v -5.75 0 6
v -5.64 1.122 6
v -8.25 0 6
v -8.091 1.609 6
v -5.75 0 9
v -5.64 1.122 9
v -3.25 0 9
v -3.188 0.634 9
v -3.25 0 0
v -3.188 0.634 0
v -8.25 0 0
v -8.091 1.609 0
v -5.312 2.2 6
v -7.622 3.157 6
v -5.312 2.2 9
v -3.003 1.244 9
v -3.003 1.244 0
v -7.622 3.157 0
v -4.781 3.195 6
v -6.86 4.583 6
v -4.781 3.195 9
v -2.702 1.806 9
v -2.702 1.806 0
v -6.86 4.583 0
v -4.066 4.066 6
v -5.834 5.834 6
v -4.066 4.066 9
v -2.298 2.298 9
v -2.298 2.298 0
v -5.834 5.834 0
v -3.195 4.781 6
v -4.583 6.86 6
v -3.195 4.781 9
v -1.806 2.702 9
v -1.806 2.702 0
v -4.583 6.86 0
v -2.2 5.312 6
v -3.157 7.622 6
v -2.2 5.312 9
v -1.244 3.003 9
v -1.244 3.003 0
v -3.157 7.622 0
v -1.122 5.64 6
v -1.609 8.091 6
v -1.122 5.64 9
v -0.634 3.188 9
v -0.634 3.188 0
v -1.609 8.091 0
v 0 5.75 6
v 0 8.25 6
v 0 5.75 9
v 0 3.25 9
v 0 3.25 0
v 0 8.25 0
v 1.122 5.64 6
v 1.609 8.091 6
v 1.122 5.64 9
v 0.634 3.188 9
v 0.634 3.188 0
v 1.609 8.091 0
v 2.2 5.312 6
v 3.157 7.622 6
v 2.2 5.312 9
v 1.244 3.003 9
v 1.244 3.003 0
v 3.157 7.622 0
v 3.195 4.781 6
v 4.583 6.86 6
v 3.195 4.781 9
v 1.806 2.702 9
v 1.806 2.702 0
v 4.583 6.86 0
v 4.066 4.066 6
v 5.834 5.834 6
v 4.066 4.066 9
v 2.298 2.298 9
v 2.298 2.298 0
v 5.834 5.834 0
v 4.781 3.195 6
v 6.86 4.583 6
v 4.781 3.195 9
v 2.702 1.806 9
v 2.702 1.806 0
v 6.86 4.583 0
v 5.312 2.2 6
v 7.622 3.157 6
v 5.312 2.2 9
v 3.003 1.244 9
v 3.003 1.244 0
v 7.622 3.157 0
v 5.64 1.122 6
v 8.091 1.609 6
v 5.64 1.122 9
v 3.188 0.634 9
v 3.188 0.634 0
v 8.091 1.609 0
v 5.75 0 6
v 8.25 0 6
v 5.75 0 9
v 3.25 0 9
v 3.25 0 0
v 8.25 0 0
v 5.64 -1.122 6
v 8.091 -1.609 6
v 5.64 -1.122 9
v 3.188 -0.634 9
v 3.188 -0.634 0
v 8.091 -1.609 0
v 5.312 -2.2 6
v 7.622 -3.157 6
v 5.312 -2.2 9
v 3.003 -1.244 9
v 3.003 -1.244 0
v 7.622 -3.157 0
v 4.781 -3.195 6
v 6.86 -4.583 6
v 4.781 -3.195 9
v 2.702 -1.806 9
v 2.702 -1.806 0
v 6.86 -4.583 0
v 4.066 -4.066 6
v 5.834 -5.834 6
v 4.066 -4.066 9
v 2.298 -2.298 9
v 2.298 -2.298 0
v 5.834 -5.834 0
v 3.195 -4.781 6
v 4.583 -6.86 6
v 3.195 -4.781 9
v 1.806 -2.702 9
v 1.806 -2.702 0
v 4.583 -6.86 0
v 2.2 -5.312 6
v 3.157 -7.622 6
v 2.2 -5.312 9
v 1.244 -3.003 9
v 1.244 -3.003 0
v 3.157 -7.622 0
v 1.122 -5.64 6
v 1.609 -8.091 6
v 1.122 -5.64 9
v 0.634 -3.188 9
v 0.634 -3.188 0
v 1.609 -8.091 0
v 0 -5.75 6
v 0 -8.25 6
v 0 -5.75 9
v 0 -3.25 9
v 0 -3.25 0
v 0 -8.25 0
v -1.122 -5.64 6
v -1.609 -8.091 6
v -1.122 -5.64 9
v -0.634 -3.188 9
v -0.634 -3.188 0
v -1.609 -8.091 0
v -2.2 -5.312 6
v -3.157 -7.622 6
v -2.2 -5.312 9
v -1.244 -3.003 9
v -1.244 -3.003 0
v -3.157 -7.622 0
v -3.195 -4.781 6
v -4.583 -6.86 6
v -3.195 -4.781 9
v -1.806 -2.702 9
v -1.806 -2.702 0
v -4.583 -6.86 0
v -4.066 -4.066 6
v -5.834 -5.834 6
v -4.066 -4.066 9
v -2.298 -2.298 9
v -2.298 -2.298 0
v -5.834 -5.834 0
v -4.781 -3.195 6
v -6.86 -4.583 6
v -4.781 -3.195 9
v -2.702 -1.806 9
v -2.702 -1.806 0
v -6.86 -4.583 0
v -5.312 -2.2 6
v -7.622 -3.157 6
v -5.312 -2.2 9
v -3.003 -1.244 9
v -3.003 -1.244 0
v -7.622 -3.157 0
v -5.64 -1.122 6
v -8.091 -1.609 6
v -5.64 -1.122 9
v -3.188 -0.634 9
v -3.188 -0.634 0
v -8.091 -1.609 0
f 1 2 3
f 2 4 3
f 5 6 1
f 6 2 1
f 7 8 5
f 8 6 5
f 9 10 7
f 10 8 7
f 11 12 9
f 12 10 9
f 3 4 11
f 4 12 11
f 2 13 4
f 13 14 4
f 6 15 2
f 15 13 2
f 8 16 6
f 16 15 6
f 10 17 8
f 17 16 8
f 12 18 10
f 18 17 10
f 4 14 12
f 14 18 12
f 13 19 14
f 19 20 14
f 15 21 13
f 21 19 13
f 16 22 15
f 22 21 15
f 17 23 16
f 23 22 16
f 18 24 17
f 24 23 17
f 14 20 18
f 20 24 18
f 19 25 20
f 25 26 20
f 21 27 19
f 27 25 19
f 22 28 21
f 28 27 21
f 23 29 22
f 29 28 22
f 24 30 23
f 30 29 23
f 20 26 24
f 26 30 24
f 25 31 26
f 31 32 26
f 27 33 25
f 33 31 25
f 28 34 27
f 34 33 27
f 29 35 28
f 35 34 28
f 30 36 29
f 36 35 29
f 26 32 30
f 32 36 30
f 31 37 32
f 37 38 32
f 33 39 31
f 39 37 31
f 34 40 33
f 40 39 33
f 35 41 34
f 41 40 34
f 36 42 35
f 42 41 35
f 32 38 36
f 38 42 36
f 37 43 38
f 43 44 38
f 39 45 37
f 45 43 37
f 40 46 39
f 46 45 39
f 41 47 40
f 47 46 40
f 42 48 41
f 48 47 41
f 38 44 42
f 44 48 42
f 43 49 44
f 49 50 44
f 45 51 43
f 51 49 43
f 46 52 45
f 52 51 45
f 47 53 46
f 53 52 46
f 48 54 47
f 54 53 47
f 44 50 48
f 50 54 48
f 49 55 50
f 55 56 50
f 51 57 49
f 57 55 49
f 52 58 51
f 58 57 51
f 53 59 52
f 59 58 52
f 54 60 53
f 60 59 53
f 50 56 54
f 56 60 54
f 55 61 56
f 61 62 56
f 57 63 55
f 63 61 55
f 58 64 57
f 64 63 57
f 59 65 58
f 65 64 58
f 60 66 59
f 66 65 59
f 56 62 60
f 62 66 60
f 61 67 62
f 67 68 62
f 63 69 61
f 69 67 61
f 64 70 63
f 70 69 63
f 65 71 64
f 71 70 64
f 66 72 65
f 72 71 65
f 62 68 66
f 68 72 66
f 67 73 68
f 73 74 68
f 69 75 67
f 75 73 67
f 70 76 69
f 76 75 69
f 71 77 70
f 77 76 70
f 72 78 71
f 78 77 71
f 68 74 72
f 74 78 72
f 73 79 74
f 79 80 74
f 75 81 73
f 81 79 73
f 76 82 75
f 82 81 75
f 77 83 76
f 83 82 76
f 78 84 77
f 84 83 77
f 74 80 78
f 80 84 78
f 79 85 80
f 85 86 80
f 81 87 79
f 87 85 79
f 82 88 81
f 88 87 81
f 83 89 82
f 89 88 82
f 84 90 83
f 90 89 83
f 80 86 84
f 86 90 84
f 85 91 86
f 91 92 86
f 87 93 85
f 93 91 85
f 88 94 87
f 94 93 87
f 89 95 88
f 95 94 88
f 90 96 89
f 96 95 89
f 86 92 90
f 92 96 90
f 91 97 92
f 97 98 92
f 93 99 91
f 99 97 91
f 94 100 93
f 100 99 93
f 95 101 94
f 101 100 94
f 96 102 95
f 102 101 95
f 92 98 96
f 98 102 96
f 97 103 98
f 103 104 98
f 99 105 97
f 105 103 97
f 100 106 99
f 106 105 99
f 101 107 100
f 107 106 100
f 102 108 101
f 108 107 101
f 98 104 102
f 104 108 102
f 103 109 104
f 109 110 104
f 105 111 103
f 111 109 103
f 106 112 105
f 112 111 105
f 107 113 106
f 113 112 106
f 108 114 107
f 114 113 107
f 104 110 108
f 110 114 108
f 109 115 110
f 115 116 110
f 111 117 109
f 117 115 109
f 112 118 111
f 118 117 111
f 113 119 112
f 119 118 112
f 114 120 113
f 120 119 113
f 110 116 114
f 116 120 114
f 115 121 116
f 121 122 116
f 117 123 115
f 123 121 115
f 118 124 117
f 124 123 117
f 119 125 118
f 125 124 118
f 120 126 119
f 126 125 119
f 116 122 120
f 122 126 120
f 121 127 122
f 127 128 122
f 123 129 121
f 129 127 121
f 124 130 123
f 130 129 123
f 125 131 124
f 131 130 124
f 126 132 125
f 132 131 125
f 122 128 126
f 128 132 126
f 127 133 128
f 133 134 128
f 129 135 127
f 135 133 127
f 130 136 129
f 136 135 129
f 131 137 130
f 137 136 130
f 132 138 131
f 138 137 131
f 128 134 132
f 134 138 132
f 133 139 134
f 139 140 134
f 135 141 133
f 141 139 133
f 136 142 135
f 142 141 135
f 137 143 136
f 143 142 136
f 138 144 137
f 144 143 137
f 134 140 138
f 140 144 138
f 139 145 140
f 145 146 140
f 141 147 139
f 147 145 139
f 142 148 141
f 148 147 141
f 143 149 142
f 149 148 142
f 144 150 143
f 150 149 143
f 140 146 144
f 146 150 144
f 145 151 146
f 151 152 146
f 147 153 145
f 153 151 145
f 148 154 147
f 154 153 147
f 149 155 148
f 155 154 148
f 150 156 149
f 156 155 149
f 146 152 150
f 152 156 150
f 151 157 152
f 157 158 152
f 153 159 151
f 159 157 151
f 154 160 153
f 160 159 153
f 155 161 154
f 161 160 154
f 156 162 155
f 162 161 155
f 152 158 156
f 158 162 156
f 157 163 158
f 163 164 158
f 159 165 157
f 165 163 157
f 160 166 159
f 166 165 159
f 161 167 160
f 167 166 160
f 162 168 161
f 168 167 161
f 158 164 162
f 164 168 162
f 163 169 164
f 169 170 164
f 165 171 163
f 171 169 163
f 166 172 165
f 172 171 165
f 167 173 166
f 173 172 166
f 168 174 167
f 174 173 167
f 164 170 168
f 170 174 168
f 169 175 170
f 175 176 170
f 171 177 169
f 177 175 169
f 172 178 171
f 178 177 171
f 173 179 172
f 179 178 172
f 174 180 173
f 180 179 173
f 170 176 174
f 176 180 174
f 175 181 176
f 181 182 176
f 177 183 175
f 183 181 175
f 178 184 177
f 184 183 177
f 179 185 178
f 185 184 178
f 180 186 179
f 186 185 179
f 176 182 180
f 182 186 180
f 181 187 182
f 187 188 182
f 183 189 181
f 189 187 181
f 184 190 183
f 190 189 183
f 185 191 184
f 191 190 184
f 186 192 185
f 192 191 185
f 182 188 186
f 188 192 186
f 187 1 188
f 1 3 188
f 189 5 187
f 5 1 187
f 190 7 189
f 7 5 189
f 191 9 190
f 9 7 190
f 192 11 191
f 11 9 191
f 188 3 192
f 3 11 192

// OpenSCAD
$fn = 32;

// ----------------------------------------------------------------------
// Form washer: stepped_c washer, 16.5 mm outside, 6.5 mm bore
// ----------------------------------------------------------------------

// --- parameters (mm) ---
revolve_angle = 360;      // full turn around the Z axis
profile_points = 6;       // points of the closed outline

profile = [[3.25, 0], [8.25, 0], [8.25, 6], [5.75, 6], [5.75, 9], [3.25, 9]];  // single closed polygon, 6 points, counter clockwise

// --- the one profile operation ---
rotate_extrude(angle = revolve_angle) polygon(points = profile);
